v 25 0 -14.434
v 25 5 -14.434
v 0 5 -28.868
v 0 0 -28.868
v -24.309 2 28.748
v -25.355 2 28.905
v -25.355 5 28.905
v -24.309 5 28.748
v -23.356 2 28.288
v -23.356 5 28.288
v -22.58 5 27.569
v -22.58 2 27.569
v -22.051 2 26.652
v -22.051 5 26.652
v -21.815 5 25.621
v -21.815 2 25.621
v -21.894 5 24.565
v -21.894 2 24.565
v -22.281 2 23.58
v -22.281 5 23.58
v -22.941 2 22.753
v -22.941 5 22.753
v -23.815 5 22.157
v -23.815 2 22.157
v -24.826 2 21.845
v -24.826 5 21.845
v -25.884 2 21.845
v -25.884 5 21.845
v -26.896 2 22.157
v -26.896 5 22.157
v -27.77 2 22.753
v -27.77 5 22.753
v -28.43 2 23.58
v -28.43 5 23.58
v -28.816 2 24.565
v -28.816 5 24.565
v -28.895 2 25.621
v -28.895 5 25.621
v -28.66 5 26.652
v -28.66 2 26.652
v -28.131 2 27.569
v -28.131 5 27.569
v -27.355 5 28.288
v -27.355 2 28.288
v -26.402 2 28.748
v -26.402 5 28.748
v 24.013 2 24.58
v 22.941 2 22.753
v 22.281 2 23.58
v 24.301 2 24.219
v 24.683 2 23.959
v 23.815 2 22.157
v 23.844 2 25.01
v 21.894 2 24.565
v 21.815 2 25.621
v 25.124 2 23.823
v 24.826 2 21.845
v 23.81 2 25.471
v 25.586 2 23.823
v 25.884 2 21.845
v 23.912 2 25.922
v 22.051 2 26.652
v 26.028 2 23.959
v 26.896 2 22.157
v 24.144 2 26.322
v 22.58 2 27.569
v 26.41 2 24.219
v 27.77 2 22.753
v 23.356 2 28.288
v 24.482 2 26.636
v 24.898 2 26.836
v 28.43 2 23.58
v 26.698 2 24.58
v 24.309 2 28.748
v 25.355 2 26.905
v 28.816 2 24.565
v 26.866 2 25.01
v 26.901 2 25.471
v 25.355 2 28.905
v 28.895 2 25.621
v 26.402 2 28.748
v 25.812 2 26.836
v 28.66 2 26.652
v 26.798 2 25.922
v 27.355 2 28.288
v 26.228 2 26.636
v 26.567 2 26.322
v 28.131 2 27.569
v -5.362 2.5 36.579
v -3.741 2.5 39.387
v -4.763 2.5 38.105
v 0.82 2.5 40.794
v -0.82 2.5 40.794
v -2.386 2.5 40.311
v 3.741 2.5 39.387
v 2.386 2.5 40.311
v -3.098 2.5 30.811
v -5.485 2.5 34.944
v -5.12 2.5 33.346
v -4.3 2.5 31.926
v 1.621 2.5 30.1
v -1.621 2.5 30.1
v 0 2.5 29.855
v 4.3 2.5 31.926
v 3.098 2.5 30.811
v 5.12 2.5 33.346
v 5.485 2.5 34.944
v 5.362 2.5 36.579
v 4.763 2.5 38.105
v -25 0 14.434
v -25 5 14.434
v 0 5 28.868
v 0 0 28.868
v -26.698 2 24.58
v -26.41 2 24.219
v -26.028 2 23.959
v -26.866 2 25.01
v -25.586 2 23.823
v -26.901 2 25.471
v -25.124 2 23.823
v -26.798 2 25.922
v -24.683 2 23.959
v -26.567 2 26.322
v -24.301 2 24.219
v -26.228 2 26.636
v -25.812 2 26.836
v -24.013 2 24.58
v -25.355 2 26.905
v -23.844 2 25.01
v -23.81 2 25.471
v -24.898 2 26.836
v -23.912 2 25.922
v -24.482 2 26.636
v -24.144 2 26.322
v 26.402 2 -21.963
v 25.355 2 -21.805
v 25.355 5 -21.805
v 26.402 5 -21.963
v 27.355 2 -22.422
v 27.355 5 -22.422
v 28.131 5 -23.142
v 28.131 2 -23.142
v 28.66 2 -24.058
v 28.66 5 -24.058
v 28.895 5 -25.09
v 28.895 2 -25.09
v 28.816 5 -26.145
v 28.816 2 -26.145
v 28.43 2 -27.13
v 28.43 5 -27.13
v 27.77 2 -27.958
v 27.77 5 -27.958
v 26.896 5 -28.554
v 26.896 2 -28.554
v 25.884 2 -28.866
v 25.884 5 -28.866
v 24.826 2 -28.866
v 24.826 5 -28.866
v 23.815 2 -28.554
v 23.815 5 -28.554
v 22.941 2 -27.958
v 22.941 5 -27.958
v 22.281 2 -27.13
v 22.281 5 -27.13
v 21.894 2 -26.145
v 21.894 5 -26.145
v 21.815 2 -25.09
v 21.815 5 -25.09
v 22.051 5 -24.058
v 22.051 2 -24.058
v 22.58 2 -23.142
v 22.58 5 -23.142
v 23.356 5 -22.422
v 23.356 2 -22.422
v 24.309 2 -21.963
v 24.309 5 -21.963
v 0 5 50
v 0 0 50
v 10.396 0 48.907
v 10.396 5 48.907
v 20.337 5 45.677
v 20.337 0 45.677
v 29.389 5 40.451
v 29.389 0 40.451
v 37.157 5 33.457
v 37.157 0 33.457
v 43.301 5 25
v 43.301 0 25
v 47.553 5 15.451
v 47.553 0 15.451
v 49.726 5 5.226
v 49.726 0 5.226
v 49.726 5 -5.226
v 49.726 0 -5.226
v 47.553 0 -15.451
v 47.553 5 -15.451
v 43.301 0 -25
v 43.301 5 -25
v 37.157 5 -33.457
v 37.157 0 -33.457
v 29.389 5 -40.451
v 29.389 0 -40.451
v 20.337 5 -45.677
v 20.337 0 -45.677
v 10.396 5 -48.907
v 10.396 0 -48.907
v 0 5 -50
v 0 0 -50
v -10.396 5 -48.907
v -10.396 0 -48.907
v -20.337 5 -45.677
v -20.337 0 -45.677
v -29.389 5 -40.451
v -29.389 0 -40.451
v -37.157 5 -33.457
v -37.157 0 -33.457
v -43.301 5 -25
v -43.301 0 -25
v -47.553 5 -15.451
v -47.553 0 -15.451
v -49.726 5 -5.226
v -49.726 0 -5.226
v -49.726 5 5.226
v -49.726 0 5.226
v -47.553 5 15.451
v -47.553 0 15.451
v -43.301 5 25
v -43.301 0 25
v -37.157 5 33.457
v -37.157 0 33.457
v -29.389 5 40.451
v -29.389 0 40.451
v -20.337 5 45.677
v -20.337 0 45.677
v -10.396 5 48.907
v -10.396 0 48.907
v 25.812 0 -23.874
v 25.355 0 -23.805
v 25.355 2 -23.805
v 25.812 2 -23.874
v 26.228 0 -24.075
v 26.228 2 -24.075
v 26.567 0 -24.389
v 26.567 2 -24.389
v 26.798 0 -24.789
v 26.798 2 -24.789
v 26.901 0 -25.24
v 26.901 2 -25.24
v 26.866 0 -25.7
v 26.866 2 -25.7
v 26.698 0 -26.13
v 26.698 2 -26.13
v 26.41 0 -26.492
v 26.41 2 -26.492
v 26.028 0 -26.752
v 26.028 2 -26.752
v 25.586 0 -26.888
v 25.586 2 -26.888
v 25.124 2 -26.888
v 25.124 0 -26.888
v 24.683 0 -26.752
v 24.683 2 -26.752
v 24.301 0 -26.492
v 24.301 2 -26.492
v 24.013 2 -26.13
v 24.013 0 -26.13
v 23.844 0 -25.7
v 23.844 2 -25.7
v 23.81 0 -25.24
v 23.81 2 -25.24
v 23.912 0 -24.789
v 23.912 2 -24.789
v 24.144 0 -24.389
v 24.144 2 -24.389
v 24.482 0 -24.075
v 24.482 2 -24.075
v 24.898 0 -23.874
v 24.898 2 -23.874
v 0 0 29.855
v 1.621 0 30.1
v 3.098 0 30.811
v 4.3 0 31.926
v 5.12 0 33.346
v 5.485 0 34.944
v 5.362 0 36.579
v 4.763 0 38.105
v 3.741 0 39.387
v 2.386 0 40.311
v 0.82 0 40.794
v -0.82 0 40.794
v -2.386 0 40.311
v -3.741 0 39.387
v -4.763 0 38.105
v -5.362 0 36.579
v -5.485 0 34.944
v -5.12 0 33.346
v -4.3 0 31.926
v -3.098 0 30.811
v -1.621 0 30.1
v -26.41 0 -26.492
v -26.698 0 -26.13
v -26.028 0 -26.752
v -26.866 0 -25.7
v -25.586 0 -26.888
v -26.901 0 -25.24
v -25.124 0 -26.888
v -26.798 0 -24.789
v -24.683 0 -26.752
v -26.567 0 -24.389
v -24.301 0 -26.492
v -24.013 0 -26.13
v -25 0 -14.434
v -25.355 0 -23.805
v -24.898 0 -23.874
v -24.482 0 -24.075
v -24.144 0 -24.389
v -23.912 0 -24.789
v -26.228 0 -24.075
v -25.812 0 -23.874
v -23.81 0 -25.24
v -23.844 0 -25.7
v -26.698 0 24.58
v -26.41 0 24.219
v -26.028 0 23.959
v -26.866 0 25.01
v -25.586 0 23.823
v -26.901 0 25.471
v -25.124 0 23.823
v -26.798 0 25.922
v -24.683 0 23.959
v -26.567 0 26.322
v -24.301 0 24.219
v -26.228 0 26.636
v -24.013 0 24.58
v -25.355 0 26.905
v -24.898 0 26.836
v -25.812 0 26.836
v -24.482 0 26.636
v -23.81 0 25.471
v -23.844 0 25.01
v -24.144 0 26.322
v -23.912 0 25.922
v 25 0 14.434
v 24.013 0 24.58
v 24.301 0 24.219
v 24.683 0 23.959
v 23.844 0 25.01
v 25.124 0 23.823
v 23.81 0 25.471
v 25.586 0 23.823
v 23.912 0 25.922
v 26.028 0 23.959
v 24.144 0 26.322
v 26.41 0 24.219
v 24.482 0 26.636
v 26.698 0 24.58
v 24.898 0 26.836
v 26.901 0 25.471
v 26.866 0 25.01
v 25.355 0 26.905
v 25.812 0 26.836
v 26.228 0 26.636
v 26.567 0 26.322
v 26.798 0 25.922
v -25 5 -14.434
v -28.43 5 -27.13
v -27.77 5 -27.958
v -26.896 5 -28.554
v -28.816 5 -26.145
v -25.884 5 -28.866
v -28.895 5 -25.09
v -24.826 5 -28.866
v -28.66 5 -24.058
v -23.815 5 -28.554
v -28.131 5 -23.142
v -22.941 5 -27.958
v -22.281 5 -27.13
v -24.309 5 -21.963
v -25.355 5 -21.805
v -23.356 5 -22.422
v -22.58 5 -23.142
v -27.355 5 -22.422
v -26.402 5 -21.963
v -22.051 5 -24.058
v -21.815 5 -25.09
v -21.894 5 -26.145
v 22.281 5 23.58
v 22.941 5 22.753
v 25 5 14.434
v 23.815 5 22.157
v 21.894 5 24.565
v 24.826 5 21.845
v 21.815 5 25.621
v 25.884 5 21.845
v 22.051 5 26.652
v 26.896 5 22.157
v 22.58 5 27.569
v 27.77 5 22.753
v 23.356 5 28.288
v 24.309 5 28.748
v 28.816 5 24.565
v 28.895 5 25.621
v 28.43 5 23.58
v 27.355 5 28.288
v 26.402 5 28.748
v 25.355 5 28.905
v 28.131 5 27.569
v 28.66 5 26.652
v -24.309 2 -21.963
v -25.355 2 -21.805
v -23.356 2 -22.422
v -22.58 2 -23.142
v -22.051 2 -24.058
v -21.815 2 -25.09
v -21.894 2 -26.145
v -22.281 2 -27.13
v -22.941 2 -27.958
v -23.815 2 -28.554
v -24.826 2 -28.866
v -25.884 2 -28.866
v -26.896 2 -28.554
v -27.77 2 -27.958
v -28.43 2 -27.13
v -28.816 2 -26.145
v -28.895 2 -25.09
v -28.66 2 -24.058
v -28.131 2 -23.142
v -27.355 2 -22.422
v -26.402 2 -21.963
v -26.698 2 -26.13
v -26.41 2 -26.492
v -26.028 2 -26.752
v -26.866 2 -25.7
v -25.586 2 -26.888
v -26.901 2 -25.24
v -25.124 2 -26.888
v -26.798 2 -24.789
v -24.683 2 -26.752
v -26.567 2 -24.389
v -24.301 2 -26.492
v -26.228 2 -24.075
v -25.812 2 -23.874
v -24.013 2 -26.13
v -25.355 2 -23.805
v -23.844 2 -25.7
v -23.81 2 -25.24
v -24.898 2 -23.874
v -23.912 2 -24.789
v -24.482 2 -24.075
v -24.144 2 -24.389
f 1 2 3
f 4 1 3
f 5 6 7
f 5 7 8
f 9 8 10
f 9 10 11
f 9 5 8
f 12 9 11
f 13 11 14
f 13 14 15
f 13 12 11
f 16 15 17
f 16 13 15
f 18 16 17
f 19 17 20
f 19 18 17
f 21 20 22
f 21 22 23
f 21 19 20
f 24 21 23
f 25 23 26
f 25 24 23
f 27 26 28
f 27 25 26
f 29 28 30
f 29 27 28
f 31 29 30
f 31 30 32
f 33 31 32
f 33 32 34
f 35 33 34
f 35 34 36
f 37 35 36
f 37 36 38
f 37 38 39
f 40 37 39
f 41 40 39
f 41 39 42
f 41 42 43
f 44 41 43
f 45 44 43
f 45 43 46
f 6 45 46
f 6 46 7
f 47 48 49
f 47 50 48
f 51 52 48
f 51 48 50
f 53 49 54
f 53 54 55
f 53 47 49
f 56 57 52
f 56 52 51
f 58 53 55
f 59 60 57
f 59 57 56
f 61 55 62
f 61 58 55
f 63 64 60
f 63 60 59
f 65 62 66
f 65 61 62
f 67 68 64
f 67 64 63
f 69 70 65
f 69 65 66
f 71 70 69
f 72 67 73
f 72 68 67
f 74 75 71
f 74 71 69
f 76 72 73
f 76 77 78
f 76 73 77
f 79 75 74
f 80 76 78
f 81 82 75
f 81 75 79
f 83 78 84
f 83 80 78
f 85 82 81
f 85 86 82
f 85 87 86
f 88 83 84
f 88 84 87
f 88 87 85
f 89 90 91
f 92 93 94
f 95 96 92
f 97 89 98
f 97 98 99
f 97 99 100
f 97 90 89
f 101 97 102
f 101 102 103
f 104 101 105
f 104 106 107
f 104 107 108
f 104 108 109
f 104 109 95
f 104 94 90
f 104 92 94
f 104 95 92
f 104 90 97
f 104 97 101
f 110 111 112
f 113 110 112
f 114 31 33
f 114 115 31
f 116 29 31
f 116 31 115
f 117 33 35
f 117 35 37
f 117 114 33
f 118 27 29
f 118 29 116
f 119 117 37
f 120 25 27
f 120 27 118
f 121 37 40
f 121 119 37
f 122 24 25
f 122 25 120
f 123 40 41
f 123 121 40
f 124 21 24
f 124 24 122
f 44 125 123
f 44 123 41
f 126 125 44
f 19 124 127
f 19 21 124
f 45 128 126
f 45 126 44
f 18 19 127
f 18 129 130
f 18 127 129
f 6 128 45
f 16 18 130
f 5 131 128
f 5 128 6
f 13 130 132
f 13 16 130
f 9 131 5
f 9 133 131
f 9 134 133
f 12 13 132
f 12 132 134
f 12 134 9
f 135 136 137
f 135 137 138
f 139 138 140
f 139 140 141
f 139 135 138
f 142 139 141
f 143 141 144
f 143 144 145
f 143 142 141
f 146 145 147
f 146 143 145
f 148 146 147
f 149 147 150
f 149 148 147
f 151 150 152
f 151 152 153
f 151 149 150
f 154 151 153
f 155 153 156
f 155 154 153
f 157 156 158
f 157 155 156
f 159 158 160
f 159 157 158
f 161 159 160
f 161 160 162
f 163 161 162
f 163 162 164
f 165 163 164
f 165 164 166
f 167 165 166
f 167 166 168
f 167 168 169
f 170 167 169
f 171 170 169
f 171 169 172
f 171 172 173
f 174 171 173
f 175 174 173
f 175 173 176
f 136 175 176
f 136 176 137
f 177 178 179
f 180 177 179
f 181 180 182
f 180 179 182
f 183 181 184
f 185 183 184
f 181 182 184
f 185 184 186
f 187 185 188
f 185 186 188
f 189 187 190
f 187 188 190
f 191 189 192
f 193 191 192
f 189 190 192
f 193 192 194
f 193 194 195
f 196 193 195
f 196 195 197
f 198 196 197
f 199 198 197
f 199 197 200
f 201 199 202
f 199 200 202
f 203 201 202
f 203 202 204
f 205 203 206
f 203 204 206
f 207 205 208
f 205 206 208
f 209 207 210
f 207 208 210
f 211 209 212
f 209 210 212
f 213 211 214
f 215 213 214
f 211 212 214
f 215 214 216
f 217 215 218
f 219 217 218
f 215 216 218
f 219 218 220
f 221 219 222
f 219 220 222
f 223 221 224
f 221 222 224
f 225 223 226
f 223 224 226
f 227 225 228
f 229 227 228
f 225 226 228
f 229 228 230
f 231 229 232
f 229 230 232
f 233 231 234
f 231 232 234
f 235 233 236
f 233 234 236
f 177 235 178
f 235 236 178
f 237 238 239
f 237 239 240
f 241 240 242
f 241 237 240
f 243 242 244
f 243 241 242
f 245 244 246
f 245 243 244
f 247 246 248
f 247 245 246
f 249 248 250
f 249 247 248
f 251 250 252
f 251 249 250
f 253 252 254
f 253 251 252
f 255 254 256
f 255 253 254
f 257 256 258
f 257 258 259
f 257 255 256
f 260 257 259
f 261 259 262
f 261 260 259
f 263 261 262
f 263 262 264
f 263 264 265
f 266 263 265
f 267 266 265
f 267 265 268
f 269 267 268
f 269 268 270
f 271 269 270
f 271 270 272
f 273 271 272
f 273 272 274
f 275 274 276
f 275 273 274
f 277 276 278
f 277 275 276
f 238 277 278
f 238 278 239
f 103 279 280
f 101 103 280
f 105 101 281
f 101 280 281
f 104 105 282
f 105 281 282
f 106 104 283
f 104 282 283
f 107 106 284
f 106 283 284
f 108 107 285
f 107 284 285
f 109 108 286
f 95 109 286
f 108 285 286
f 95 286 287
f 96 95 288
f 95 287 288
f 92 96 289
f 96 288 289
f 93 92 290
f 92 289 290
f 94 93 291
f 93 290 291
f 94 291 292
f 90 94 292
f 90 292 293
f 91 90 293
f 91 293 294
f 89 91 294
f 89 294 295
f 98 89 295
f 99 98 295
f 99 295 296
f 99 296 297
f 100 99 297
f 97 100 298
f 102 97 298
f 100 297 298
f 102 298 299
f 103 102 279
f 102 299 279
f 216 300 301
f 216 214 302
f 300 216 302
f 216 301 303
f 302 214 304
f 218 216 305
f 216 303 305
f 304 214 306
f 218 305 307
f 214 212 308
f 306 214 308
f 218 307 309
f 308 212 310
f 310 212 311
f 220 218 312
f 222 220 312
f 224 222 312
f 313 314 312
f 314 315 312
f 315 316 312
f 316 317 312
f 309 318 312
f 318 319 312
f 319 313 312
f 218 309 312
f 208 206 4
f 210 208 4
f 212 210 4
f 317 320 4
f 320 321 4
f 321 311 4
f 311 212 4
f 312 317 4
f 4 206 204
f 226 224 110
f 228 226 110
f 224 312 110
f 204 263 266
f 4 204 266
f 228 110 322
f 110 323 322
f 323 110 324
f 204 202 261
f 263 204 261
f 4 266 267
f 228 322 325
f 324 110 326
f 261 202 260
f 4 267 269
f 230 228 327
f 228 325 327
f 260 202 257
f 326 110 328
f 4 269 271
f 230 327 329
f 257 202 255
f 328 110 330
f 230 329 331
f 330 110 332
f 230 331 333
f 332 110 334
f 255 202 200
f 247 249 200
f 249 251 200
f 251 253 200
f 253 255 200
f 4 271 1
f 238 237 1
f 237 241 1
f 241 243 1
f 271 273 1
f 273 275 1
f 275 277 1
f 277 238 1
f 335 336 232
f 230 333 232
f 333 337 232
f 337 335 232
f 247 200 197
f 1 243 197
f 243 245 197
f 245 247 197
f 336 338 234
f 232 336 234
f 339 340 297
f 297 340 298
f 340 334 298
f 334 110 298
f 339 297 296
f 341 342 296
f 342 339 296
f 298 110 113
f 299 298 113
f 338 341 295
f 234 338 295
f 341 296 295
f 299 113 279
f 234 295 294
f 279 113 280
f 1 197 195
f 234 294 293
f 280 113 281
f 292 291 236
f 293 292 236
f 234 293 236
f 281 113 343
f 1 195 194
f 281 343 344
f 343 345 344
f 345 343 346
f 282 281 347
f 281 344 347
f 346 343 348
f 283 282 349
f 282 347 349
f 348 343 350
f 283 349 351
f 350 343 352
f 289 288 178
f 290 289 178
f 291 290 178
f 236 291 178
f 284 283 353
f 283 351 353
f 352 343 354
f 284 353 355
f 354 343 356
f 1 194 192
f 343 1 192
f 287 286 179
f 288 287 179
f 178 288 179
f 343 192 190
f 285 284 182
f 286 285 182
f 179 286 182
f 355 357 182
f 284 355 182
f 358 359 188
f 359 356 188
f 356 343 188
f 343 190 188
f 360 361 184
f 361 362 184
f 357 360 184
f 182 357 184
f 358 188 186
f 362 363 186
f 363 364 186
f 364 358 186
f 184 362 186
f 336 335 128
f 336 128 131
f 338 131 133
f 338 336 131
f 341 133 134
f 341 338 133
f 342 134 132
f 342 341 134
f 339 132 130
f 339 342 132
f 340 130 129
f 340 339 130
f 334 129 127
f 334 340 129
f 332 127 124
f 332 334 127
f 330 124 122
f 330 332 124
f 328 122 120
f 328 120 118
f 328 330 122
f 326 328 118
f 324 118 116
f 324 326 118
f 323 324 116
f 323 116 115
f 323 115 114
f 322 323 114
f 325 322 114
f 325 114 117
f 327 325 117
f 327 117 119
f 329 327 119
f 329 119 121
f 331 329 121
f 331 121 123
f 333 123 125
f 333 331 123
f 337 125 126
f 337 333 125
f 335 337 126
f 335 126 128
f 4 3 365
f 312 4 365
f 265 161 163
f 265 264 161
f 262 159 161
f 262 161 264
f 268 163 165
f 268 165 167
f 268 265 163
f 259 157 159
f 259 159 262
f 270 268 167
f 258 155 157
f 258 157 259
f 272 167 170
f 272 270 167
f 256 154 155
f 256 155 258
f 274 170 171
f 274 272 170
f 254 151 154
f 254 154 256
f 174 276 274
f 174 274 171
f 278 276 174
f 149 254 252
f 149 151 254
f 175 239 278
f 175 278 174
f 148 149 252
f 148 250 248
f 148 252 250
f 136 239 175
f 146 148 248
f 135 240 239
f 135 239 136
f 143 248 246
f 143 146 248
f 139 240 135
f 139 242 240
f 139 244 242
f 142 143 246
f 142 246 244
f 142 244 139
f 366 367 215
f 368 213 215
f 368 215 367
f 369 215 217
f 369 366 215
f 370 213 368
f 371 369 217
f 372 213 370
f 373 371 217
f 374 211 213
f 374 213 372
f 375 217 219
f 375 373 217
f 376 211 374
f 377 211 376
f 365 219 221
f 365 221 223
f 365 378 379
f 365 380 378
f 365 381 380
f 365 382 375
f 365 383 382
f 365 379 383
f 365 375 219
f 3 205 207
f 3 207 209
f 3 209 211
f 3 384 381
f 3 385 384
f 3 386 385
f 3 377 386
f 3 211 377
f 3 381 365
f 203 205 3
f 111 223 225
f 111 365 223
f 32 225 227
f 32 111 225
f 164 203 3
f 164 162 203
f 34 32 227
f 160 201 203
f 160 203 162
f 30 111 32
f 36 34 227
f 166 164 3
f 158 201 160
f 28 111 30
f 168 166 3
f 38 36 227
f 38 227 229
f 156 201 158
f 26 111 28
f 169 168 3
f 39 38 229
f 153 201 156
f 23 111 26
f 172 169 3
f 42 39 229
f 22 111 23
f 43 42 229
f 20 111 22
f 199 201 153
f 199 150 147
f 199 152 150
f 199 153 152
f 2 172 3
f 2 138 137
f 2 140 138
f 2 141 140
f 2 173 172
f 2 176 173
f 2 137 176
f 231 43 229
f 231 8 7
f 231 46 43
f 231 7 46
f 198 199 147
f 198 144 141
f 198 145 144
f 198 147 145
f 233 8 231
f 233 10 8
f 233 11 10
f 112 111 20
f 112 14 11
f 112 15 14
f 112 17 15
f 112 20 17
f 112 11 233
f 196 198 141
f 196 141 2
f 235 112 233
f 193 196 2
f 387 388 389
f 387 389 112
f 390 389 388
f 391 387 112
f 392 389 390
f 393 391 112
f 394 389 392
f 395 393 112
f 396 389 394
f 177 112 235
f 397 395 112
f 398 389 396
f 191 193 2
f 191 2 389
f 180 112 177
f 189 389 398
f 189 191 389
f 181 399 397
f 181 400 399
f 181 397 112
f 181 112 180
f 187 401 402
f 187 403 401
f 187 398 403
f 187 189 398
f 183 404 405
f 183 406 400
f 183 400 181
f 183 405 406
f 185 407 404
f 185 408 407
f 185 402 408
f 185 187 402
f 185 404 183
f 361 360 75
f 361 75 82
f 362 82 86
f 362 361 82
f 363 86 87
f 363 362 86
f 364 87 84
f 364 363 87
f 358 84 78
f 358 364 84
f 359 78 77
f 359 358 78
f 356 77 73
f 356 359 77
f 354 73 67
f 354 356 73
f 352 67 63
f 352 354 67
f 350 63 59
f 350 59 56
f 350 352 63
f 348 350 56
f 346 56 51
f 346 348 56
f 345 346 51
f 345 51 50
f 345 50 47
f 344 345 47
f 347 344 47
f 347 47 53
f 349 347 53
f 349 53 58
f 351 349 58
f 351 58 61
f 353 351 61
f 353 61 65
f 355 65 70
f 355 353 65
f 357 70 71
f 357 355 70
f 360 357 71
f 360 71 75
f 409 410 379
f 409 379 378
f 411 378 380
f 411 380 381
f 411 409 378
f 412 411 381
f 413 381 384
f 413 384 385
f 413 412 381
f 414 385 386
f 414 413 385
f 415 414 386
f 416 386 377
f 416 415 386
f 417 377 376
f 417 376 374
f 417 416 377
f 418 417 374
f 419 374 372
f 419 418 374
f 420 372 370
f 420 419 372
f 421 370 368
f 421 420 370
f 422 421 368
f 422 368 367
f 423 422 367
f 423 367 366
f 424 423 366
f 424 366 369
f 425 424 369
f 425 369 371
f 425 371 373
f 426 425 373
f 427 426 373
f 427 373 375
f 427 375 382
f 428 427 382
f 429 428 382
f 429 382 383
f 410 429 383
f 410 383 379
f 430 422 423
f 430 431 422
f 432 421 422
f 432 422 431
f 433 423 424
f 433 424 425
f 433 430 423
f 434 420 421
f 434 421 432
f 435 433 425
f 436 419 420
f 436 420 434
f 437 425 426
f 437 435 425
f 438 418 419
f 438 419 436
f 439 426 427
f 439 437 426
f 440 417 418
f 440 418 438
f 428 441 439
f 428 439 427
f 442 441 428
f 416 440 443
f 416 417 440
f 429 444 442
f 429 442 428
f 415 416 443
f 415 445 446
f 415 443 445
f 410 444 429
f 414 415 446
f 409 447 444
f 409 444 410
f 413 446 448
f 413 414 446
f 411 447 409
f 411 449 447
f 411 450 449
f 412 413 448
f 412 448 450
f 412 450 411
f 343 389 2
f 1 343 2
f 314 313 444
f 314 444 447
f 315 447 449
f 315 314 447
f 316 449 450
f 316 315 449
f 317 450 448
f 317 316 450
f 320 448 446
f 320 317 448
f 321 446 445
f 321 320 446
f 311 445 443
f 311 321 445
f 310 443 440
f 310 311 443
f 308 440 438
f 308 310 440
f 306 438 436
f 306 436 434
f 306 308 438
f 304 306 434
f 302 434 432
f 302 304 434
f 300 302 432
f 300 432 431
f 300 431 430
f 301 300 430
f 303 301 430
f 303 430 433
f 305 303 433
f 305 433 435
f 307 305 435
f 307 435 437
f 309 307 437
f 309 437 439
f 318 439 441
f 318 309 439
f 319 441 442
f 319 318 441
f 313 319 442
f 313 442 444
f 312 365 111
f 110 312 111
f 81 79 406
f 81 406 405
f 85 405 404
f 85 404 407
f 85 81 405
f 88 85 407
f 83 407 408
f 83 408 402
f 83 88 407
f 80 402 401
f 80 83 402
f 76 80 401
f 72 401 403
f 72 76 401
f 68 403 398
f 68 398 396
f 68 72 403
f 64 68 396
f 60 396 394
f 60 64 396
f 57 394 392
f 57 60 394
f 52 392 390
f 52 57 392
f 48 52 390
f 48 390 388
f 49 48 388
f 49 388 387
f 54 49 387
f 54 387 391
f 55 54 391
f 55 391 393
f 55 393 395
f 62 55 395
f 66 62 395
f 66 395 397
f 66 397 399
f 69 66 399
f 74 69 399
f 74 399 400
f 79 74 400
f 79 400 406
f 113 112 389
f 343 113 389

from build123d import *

# Parameters (mm, degrees)
SKETCH1_R           = 50
SKETCH1_R_2         = 3.55
BOSS_EXTRUDE1_DEPTH = 5
SKETCH1_3_R         = 3.55
SKETCH1_3_R_2       = 1.55
BOSS_EXTRUDE2_DEPTH = 2
SKETCH2_R           = 5.5
CUT_EXTRUDE1_DEPTH  = 2.5
CUT_EXTRUDE2_DEPTH  = 10


with BuildPart() as part:
    # Sketch1 → Boss-Extrude1 (new body)
    with BuildSketch(Plane(origin=(0, 0, 0), x_dir=(1, 0, 0), z_dir=(0, 1, 0))):
        Circle(SKETCH1_R)
        with Locations((-25.355339059, -25.355339059)):
            Circle(SKETCH1_R_2, mode=Mode.SUBTRACT)
        with Locations((25.355339059, -25.355339059)):
            Circle(SKETCH1_R_2, mode=Mode.SUBTRACT)
        with Locations((-25.355339059, 25.355339059)):
            Circle(SKETCH1_R_2, mode=Mode.SUBTRACT)
        with Locations((25.355339059, 25.355339059)):
            Circle(SKETCH1_R_2, mode=Mode.SUBTRACT)
    extrude(amount=BOSS_EXTRUDE1_DEPTH)

    # Sketch1<3> → Boss-Extrude2 (add)
    # profile 1 of 4: a face of its own
    with BuildSketch(Plane(origin=(0, 0, 0), x_dir=(1, 0, 0), z_dir=(0, 1, 0))):
        with Locations((-25.355339059, 25.355339059)):
            Circle(SKETCH1_3_R)
        with Locations((-25.355339059, 25.355339059)):
            Circle(SKETCH1_3_R_2, mode=Mode.SUBTRACT)
    # profile 2 of 4: a face of its own
    with BuildSketch(Plane(origin=(0, 0, 0), x_dir=(1, 0, 0), z_dir=(0, 1, 0))):
        with Locations((25.355339059, 25.355339059)):
            Circle(SKETCH1_3_R)
        with Locations((25.355339059, 25.355339059)):
            Circle(SKETCH1_3_R_2, mode=Mode.SUBTRACT)
    # profile 3 of 4: a face of its own
    with BuildSketch(Plane(origin=(0, 0, 0), x_dir=(1, 0, 0), z_dir=(0, 1, 0))):
        with Locations((-25.355339059, -25.355339059)):
            Circle(SKETCH1_3_R)
        with Locations((-25.355339059, -25.355339059)):
            Circle(SKETCH1_3_R_2, mode=Mode.SUBTRACT)
    # profile 4 of 4: a face of its own
    with BuildSketch(Plane(origin=(0, 0, 0), x_dir=(1, 0, 0), z_dir=(0, 1, 0))):
        with Locations((25.355339059, -25.355339059)):
            Circle(SKETCH1_3_R)
        with Locations((25.355339059, -25.355339059)):
            Circle(SKETCH1_3_R_2, mode=Mode.SUBTRACT)
    extrude(amount=BOSS_EXTRUDE2_DEPTH)

    # Sketch2 → Cut-Extrude1 (cut)
    with BuildSketch(Plane.XZ):
        with Locations((0, 35.355339059)):
            Circle(SKETCH2_R)
    extrude(amount=-CUT_EXTRUDE1_DEPTH, mode=Mode.SUBTRACT)

    # Sketch3 → Cut-Extrude2 (cut)
    with BuildSketch(Plane(origin=(0, 5, 0), x_dir=(1, 0, 0), z_dir=(0, 1, 0))):
        Polygon((0, 28.867513459), (-25, 14.43375673), (-25, -14.43375673), (0, -28.867513459), (25, -14.43375673), (25, 14.43375673), align=None)
    extrude(amount=-CUT_EXTRUDE2_DEPTH, mode=Mode.SUBTRACT)


solid = part.part
